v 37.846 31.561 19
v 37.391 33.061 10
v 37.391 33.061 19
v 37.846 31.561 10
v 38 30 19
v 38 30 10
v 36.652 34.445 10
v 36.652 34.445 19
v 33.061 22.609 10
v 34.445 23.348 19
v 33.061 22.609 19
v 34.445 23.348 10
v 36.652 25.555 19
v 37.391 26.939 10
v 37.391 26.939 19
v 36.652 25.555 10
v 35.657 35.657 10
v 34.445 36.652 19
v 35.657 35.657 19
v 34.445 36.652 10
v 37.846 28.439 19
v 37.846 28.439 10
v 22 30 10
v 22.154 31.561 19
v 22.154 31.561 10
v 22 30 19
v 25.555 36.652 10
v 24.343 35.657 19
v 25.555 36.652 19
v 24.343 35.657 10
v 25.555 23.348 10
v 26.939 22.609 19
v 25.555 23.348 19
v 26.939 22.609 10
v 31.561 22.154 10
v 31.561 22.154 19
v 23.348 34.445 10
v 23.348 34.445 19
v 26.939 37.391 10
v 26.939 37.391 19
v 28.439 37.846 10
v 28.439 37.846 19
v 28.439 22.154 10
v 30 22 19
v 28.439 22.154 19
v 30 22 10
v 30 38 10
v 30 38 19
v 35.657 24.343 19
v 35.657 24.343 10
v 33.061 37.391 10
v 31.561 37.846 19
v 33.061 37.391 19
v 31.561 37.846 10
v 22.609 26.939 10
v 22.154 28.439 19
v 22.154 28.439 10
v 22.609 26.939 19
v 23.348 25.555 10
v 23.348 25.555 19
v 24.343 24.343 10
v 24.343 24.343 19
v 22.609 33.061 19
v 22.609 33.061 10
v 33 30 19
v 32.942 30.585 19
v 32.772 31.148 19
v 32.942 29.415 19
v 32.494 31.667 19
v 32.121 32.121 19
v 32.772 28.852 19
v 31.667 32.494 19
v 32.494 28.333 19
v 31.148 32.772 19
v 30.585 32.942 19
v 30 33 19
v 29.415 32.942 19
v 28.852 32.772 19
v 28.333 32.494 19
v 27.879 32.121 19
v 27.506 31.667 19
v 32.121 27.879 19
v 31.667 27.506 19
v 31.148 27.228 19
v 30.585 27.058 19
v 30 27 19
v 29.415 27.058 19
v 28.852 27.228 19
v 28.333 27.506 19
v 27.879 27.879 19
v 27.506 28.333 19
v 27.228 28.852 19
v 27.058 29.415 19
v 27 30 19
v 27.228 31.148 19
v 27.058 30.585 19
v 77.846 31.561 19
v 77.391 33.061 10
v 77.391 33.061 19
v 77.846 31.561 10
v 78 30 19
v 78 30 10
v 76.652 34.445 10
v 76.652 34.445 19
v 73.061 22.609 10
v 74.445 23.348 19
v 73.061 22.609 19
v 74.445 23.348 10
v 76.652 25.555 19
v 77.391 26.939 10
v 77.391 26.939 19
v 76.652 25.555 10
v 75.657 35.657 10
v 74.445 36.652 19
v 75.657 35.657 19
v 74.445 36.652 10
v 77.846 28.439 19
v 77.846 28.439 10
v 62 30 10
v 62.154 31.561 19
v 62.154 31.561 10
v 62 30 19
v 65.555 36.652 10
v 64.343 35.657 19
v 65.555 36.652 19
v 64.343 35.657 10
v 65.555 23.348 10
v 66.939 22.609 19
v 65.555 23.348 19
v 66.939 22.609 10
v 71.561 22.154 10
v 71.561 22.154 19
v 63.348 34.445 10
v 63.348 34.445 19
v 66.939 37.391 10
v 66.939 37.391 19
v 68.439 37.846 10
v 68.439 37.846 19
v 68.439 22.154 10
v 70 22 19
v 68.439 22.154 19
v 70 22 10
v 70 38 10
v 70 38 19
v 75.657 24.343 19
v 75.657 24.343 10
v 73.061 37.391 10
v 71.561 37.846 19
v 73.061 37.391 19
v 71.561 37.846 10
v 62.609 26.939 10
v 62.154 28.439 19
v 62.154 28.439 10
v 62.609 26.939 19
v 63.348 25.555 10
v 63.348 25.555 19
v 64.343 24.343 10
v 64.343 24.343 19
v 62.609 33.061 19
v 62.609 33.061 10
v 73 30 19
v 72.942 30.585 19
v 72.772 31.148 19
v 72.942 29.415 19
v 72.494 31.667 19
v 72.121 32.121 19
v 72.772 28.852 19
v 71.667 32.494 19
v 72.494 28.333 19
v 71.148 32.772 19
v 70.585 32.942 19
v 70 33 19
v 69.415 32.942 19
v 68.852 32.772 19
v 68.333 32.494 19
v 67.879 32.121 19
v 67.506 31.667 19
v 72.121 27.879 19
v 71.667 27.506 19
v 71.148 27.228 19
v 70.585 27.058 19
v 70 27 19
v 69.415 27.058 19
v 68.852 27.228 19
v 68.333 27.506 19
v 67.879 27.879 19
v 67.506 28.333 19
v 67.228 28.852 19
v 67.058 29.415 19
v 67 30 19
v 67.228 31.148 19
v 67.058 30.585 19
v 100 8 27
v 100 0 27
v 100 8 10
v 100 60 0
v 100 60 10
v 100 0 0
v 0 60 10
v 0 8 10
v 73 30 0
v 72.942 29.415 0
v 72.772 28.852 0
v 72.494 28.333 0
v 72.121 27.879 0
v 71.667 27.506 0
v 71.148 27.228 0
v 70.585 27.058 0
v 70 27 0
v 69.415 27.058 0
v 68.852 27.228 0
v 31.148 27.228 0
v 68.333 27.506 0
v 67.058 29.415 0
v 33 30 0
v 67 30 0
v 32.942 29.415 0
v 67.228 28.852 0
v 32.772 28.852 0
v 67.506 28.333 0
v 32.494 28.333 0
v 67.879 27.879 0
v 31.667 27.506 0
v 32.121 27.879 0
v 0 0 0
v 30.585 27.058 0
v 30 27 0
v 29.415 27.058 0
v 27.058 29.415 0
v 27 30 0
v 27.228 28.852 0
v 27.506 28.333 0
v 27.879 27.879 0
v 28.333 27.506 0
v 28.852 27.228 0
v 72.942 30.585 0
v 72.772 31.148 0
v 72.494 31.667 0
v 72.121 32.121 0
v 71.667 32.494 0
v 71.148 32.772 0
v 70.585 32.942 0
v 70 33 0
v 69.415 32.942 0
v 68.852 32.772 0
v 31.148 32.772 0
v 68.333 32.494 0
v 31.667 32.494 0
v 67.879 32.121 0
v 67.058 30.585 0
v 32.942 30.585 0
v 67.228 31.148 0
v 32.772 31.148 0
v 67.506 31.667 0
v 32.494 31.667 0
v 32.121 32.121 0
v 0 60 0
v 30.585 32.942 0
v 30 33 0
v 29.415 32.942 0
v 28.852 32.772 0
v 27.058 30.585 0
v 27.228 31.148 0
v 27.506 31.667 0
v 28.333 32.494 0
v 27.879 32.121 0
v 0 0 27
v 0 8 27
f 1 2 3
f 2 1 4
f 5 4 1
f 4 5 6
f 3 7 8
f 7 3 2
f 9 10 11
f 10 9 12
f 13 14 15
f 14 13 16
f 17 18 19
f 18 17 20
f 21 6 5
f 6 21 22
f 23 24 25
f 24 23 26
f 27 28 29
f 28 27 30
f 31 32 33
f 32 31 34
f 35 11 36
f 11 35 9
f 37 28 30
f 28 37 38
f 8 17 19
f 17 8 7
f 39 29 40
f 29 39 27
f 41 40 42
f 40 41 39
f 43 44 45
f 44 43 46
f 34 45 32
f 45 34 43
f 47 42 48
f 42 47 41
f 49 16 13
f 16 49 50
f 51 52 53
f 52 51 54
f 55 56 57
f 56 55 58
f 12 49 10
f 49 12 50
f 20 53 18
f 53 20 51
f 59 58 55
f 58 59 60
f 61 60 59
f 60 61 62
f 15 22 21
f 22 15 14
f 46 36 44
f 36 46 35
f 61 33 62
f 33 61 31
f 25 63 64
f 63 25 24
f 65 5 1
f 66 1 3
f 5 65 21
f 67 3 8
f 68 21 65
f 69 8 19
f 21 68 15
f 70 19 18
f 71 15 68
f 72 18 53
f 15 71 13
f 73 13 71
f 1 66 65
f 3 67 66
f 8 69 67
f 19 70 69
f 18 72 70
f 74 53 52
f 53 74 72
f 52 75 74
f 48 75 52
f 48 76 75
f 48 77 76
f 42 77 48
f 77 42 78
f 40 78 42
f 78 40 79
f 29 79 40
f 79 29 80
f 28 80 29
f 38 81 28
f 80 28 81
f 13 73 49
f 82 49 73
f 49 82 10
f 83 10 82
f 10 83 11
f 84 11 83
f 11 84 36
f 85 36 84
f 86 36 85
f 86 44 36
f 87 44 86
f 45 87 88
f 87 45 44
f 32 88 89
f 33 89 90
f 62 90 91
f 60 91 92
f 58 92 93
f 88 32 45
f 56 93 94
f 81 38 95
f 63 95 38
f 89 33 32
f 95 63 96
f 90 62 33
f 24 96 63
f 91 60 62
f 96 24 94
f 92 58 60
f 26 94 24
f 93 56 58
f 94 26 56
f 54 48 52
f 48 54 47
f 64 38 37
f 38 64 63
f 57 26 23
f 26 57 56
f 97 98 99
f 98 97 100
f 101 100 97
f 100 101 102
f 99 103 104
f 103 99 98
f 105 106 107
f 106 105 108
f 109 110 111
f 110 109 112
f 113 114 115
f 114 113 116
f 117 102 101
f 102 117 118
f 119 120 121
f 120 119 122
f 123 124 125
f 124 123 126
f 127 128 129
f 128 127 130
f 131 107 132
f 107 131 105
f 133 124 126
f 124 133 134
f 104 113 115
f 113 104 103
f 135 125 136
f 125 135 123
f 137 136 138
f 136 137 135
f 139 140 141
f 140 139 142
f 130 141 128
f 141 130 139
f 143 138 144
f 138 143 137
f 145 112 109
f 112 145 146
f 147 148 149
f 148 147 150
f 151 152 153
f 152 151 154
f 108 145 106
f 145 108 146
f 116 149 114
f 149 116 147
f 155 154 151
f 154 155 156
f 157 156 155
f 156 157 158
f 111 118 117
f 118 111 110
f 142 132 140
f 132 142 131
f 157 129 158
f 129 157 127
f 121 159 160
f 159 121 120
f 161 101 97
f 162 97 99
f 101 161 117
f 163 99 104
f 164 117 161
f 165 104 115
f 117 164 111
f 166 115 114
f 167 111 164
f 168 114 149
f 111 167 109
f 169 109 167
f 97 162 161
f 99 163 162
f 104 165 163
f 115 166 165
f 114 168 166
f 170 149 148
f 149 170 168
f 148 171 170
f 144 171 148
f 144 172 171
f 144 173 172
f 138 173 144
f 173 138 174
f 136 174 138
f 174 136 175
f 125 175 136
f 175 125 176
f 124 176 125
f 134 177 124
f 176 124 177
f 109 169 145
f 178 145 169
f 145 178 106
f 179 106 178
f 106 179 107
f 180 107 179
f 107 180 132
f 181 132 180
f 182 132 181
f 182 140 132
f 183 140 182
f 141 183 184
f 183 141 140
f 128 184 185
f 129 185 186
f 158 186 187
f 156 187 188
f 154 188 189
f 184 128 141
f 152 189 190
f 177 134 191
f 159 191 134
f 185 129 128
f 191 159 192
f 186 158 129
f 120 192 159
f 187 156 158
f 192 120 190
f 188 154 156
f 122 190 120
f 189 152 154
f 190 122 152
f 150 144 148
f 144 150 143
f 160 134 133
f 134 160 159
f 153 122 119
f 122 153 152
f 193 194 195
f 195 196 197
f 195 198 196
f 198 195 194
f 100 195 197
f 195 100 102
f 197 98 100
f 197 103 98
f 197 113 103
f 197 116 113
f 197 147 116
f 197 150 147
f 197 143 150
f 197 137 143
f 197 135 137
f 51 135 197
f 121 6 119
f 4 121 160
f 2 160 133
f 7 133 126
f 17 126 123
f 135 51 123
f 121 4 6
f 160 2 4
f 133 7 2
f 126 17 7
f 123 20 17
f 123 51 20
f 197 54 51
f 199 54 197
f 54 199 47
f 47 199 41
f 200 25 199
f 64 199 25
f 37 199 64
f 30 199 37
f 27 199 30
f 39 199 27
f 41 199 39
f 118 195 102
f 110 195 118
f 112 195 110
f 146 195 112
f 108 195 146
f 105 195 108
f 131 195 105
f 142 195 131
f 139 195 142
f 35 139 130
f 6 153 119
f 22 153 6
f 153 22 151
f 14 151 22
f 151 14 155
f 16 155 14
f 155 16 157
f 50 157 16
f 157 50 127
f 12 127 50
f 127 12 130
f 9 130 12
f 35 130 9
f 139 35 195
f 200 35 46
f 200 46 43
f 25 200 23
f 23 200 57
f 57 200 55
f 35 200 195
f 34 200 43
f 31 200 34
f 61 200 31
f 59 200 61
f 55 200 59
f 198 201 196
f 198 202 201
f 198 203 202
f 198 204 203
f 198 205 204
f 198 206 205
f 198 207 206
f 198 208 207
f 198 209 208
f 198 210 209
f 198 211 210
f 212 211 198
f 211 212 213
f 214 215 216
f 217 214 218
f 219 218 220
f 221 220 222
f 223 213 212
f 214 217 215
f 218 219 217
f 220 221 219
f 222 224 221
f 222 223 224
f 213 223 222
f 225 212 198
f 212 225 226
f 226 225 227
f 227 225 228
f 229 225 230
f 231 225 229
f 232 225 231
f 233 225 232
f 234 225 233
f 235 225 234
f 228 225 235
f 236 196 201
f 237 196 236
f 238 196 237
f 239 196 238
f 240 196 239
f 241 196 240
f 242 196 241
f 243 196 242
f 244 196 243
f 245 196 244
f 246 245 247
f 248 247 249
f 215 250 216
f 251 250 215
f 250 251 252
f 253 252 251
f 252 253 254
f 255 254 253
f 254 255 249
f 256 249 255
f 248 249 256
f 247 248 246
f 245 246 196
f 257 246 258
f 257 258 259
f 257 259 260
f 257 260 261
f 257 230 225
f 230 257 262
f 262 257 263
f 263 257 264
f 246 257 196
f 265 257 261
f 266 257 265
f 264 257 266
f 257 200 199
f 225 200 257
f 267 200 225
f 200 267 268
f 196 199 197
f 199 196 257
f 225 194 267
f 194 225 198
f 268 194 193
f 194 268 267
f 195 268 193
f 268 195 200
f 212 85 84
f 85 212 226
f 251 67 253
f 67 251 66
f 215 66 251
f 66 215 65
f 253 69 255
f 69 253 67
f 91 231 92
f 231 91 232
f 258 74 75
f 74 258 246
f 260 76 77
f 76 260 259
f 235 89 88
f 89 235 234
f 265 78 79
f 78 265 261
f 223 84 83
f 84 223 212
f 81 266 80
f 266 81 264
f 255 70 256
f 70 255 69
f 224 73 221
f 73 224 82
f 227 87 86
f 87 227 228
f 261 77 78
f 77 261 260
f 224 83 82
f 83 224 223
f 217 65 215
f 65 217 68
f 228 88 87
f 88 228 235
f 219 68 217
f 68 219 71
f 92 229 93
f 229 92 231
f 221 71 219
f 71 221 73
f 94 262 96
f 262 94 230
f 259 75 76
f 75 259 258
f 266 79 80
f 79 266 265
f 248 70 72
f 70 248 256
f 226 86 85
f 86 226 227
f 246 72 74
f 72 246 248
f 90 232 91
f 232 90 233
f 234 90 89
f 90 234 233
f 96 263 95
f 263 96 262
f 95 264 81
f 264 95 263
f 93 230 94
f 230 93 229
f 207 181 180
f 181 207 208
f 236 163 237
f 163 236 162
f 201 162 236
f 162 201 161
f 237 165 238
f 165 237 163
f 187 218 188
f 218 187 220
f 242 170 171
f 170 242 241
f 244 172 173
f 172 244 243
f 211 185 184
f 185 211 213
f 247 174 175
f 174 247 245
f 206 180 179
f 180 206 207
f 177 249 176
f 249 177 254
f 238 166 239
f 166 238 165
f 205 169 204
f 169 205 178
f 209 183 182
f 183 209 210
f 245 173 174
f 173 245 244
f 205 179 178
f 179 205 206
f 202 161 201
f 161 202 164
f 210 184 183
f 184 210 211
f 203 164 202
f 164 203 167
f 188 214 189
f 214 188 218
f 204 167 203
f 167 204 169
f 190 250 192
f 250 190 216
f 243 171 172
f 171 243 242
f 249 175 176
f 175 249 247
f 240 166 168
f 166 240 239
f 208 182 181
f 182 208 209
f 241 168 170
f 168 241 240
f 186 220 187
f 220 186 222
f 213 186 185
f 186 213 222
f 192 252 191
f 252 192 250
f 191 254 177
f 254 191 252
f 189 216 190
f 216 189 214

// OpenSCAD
$fn = 32;

// ----------------------------------------------------------------------
// Drill jig: fence jig
// ----------------------------------------------------------------------

// --- parameters (mm) ---
plate_l = 100;            // plate length, X
plate_w = 60;             // plate width, Y
plate_t = 10;             // plate thickness
boss_d = 16;              // guide boss diameter
boss_h = 10;              // boss height above the plate
guide_d = 6;              // guide hole diameter
boss_pitch = 40;          // boss pitch
fence_h = 18;             // fence height above the plate
fence_t = 8;              // fence thickness

n_boss = 2;  // guide bosses
boss_x0 = (plate_l - (n_boss - 1) * boss_pitch) / 2;  // first boss X
boss_top = plate_t - 1 + boss_h;  // boss crown height
fence_top = plate_t - 1 + fence_h;  // fence crown height
total_h = max([fence_top, boss_top]);  // overall height

difference() {
  union() {
  cube([plate_l, plate_w, plate_t]);
  for (i = [0 : n_boss - 1])
    translate([boss_x0 + i * boss_pitch, plate_w / 2, plate_t - 1])
      cylinder(h = boss_h, d = boss_d);
  translate([0, 0, plate_t - 1]) cube([plate_l, fence_t, fence_h]);
  }
  for (i = [0 : n_boss - 1])
    translate([boss_x0 + i * boss_pitch, plate_w / 2, -1])
      cylinder(h = plate_t + boss_h, d = guide_d);
}
